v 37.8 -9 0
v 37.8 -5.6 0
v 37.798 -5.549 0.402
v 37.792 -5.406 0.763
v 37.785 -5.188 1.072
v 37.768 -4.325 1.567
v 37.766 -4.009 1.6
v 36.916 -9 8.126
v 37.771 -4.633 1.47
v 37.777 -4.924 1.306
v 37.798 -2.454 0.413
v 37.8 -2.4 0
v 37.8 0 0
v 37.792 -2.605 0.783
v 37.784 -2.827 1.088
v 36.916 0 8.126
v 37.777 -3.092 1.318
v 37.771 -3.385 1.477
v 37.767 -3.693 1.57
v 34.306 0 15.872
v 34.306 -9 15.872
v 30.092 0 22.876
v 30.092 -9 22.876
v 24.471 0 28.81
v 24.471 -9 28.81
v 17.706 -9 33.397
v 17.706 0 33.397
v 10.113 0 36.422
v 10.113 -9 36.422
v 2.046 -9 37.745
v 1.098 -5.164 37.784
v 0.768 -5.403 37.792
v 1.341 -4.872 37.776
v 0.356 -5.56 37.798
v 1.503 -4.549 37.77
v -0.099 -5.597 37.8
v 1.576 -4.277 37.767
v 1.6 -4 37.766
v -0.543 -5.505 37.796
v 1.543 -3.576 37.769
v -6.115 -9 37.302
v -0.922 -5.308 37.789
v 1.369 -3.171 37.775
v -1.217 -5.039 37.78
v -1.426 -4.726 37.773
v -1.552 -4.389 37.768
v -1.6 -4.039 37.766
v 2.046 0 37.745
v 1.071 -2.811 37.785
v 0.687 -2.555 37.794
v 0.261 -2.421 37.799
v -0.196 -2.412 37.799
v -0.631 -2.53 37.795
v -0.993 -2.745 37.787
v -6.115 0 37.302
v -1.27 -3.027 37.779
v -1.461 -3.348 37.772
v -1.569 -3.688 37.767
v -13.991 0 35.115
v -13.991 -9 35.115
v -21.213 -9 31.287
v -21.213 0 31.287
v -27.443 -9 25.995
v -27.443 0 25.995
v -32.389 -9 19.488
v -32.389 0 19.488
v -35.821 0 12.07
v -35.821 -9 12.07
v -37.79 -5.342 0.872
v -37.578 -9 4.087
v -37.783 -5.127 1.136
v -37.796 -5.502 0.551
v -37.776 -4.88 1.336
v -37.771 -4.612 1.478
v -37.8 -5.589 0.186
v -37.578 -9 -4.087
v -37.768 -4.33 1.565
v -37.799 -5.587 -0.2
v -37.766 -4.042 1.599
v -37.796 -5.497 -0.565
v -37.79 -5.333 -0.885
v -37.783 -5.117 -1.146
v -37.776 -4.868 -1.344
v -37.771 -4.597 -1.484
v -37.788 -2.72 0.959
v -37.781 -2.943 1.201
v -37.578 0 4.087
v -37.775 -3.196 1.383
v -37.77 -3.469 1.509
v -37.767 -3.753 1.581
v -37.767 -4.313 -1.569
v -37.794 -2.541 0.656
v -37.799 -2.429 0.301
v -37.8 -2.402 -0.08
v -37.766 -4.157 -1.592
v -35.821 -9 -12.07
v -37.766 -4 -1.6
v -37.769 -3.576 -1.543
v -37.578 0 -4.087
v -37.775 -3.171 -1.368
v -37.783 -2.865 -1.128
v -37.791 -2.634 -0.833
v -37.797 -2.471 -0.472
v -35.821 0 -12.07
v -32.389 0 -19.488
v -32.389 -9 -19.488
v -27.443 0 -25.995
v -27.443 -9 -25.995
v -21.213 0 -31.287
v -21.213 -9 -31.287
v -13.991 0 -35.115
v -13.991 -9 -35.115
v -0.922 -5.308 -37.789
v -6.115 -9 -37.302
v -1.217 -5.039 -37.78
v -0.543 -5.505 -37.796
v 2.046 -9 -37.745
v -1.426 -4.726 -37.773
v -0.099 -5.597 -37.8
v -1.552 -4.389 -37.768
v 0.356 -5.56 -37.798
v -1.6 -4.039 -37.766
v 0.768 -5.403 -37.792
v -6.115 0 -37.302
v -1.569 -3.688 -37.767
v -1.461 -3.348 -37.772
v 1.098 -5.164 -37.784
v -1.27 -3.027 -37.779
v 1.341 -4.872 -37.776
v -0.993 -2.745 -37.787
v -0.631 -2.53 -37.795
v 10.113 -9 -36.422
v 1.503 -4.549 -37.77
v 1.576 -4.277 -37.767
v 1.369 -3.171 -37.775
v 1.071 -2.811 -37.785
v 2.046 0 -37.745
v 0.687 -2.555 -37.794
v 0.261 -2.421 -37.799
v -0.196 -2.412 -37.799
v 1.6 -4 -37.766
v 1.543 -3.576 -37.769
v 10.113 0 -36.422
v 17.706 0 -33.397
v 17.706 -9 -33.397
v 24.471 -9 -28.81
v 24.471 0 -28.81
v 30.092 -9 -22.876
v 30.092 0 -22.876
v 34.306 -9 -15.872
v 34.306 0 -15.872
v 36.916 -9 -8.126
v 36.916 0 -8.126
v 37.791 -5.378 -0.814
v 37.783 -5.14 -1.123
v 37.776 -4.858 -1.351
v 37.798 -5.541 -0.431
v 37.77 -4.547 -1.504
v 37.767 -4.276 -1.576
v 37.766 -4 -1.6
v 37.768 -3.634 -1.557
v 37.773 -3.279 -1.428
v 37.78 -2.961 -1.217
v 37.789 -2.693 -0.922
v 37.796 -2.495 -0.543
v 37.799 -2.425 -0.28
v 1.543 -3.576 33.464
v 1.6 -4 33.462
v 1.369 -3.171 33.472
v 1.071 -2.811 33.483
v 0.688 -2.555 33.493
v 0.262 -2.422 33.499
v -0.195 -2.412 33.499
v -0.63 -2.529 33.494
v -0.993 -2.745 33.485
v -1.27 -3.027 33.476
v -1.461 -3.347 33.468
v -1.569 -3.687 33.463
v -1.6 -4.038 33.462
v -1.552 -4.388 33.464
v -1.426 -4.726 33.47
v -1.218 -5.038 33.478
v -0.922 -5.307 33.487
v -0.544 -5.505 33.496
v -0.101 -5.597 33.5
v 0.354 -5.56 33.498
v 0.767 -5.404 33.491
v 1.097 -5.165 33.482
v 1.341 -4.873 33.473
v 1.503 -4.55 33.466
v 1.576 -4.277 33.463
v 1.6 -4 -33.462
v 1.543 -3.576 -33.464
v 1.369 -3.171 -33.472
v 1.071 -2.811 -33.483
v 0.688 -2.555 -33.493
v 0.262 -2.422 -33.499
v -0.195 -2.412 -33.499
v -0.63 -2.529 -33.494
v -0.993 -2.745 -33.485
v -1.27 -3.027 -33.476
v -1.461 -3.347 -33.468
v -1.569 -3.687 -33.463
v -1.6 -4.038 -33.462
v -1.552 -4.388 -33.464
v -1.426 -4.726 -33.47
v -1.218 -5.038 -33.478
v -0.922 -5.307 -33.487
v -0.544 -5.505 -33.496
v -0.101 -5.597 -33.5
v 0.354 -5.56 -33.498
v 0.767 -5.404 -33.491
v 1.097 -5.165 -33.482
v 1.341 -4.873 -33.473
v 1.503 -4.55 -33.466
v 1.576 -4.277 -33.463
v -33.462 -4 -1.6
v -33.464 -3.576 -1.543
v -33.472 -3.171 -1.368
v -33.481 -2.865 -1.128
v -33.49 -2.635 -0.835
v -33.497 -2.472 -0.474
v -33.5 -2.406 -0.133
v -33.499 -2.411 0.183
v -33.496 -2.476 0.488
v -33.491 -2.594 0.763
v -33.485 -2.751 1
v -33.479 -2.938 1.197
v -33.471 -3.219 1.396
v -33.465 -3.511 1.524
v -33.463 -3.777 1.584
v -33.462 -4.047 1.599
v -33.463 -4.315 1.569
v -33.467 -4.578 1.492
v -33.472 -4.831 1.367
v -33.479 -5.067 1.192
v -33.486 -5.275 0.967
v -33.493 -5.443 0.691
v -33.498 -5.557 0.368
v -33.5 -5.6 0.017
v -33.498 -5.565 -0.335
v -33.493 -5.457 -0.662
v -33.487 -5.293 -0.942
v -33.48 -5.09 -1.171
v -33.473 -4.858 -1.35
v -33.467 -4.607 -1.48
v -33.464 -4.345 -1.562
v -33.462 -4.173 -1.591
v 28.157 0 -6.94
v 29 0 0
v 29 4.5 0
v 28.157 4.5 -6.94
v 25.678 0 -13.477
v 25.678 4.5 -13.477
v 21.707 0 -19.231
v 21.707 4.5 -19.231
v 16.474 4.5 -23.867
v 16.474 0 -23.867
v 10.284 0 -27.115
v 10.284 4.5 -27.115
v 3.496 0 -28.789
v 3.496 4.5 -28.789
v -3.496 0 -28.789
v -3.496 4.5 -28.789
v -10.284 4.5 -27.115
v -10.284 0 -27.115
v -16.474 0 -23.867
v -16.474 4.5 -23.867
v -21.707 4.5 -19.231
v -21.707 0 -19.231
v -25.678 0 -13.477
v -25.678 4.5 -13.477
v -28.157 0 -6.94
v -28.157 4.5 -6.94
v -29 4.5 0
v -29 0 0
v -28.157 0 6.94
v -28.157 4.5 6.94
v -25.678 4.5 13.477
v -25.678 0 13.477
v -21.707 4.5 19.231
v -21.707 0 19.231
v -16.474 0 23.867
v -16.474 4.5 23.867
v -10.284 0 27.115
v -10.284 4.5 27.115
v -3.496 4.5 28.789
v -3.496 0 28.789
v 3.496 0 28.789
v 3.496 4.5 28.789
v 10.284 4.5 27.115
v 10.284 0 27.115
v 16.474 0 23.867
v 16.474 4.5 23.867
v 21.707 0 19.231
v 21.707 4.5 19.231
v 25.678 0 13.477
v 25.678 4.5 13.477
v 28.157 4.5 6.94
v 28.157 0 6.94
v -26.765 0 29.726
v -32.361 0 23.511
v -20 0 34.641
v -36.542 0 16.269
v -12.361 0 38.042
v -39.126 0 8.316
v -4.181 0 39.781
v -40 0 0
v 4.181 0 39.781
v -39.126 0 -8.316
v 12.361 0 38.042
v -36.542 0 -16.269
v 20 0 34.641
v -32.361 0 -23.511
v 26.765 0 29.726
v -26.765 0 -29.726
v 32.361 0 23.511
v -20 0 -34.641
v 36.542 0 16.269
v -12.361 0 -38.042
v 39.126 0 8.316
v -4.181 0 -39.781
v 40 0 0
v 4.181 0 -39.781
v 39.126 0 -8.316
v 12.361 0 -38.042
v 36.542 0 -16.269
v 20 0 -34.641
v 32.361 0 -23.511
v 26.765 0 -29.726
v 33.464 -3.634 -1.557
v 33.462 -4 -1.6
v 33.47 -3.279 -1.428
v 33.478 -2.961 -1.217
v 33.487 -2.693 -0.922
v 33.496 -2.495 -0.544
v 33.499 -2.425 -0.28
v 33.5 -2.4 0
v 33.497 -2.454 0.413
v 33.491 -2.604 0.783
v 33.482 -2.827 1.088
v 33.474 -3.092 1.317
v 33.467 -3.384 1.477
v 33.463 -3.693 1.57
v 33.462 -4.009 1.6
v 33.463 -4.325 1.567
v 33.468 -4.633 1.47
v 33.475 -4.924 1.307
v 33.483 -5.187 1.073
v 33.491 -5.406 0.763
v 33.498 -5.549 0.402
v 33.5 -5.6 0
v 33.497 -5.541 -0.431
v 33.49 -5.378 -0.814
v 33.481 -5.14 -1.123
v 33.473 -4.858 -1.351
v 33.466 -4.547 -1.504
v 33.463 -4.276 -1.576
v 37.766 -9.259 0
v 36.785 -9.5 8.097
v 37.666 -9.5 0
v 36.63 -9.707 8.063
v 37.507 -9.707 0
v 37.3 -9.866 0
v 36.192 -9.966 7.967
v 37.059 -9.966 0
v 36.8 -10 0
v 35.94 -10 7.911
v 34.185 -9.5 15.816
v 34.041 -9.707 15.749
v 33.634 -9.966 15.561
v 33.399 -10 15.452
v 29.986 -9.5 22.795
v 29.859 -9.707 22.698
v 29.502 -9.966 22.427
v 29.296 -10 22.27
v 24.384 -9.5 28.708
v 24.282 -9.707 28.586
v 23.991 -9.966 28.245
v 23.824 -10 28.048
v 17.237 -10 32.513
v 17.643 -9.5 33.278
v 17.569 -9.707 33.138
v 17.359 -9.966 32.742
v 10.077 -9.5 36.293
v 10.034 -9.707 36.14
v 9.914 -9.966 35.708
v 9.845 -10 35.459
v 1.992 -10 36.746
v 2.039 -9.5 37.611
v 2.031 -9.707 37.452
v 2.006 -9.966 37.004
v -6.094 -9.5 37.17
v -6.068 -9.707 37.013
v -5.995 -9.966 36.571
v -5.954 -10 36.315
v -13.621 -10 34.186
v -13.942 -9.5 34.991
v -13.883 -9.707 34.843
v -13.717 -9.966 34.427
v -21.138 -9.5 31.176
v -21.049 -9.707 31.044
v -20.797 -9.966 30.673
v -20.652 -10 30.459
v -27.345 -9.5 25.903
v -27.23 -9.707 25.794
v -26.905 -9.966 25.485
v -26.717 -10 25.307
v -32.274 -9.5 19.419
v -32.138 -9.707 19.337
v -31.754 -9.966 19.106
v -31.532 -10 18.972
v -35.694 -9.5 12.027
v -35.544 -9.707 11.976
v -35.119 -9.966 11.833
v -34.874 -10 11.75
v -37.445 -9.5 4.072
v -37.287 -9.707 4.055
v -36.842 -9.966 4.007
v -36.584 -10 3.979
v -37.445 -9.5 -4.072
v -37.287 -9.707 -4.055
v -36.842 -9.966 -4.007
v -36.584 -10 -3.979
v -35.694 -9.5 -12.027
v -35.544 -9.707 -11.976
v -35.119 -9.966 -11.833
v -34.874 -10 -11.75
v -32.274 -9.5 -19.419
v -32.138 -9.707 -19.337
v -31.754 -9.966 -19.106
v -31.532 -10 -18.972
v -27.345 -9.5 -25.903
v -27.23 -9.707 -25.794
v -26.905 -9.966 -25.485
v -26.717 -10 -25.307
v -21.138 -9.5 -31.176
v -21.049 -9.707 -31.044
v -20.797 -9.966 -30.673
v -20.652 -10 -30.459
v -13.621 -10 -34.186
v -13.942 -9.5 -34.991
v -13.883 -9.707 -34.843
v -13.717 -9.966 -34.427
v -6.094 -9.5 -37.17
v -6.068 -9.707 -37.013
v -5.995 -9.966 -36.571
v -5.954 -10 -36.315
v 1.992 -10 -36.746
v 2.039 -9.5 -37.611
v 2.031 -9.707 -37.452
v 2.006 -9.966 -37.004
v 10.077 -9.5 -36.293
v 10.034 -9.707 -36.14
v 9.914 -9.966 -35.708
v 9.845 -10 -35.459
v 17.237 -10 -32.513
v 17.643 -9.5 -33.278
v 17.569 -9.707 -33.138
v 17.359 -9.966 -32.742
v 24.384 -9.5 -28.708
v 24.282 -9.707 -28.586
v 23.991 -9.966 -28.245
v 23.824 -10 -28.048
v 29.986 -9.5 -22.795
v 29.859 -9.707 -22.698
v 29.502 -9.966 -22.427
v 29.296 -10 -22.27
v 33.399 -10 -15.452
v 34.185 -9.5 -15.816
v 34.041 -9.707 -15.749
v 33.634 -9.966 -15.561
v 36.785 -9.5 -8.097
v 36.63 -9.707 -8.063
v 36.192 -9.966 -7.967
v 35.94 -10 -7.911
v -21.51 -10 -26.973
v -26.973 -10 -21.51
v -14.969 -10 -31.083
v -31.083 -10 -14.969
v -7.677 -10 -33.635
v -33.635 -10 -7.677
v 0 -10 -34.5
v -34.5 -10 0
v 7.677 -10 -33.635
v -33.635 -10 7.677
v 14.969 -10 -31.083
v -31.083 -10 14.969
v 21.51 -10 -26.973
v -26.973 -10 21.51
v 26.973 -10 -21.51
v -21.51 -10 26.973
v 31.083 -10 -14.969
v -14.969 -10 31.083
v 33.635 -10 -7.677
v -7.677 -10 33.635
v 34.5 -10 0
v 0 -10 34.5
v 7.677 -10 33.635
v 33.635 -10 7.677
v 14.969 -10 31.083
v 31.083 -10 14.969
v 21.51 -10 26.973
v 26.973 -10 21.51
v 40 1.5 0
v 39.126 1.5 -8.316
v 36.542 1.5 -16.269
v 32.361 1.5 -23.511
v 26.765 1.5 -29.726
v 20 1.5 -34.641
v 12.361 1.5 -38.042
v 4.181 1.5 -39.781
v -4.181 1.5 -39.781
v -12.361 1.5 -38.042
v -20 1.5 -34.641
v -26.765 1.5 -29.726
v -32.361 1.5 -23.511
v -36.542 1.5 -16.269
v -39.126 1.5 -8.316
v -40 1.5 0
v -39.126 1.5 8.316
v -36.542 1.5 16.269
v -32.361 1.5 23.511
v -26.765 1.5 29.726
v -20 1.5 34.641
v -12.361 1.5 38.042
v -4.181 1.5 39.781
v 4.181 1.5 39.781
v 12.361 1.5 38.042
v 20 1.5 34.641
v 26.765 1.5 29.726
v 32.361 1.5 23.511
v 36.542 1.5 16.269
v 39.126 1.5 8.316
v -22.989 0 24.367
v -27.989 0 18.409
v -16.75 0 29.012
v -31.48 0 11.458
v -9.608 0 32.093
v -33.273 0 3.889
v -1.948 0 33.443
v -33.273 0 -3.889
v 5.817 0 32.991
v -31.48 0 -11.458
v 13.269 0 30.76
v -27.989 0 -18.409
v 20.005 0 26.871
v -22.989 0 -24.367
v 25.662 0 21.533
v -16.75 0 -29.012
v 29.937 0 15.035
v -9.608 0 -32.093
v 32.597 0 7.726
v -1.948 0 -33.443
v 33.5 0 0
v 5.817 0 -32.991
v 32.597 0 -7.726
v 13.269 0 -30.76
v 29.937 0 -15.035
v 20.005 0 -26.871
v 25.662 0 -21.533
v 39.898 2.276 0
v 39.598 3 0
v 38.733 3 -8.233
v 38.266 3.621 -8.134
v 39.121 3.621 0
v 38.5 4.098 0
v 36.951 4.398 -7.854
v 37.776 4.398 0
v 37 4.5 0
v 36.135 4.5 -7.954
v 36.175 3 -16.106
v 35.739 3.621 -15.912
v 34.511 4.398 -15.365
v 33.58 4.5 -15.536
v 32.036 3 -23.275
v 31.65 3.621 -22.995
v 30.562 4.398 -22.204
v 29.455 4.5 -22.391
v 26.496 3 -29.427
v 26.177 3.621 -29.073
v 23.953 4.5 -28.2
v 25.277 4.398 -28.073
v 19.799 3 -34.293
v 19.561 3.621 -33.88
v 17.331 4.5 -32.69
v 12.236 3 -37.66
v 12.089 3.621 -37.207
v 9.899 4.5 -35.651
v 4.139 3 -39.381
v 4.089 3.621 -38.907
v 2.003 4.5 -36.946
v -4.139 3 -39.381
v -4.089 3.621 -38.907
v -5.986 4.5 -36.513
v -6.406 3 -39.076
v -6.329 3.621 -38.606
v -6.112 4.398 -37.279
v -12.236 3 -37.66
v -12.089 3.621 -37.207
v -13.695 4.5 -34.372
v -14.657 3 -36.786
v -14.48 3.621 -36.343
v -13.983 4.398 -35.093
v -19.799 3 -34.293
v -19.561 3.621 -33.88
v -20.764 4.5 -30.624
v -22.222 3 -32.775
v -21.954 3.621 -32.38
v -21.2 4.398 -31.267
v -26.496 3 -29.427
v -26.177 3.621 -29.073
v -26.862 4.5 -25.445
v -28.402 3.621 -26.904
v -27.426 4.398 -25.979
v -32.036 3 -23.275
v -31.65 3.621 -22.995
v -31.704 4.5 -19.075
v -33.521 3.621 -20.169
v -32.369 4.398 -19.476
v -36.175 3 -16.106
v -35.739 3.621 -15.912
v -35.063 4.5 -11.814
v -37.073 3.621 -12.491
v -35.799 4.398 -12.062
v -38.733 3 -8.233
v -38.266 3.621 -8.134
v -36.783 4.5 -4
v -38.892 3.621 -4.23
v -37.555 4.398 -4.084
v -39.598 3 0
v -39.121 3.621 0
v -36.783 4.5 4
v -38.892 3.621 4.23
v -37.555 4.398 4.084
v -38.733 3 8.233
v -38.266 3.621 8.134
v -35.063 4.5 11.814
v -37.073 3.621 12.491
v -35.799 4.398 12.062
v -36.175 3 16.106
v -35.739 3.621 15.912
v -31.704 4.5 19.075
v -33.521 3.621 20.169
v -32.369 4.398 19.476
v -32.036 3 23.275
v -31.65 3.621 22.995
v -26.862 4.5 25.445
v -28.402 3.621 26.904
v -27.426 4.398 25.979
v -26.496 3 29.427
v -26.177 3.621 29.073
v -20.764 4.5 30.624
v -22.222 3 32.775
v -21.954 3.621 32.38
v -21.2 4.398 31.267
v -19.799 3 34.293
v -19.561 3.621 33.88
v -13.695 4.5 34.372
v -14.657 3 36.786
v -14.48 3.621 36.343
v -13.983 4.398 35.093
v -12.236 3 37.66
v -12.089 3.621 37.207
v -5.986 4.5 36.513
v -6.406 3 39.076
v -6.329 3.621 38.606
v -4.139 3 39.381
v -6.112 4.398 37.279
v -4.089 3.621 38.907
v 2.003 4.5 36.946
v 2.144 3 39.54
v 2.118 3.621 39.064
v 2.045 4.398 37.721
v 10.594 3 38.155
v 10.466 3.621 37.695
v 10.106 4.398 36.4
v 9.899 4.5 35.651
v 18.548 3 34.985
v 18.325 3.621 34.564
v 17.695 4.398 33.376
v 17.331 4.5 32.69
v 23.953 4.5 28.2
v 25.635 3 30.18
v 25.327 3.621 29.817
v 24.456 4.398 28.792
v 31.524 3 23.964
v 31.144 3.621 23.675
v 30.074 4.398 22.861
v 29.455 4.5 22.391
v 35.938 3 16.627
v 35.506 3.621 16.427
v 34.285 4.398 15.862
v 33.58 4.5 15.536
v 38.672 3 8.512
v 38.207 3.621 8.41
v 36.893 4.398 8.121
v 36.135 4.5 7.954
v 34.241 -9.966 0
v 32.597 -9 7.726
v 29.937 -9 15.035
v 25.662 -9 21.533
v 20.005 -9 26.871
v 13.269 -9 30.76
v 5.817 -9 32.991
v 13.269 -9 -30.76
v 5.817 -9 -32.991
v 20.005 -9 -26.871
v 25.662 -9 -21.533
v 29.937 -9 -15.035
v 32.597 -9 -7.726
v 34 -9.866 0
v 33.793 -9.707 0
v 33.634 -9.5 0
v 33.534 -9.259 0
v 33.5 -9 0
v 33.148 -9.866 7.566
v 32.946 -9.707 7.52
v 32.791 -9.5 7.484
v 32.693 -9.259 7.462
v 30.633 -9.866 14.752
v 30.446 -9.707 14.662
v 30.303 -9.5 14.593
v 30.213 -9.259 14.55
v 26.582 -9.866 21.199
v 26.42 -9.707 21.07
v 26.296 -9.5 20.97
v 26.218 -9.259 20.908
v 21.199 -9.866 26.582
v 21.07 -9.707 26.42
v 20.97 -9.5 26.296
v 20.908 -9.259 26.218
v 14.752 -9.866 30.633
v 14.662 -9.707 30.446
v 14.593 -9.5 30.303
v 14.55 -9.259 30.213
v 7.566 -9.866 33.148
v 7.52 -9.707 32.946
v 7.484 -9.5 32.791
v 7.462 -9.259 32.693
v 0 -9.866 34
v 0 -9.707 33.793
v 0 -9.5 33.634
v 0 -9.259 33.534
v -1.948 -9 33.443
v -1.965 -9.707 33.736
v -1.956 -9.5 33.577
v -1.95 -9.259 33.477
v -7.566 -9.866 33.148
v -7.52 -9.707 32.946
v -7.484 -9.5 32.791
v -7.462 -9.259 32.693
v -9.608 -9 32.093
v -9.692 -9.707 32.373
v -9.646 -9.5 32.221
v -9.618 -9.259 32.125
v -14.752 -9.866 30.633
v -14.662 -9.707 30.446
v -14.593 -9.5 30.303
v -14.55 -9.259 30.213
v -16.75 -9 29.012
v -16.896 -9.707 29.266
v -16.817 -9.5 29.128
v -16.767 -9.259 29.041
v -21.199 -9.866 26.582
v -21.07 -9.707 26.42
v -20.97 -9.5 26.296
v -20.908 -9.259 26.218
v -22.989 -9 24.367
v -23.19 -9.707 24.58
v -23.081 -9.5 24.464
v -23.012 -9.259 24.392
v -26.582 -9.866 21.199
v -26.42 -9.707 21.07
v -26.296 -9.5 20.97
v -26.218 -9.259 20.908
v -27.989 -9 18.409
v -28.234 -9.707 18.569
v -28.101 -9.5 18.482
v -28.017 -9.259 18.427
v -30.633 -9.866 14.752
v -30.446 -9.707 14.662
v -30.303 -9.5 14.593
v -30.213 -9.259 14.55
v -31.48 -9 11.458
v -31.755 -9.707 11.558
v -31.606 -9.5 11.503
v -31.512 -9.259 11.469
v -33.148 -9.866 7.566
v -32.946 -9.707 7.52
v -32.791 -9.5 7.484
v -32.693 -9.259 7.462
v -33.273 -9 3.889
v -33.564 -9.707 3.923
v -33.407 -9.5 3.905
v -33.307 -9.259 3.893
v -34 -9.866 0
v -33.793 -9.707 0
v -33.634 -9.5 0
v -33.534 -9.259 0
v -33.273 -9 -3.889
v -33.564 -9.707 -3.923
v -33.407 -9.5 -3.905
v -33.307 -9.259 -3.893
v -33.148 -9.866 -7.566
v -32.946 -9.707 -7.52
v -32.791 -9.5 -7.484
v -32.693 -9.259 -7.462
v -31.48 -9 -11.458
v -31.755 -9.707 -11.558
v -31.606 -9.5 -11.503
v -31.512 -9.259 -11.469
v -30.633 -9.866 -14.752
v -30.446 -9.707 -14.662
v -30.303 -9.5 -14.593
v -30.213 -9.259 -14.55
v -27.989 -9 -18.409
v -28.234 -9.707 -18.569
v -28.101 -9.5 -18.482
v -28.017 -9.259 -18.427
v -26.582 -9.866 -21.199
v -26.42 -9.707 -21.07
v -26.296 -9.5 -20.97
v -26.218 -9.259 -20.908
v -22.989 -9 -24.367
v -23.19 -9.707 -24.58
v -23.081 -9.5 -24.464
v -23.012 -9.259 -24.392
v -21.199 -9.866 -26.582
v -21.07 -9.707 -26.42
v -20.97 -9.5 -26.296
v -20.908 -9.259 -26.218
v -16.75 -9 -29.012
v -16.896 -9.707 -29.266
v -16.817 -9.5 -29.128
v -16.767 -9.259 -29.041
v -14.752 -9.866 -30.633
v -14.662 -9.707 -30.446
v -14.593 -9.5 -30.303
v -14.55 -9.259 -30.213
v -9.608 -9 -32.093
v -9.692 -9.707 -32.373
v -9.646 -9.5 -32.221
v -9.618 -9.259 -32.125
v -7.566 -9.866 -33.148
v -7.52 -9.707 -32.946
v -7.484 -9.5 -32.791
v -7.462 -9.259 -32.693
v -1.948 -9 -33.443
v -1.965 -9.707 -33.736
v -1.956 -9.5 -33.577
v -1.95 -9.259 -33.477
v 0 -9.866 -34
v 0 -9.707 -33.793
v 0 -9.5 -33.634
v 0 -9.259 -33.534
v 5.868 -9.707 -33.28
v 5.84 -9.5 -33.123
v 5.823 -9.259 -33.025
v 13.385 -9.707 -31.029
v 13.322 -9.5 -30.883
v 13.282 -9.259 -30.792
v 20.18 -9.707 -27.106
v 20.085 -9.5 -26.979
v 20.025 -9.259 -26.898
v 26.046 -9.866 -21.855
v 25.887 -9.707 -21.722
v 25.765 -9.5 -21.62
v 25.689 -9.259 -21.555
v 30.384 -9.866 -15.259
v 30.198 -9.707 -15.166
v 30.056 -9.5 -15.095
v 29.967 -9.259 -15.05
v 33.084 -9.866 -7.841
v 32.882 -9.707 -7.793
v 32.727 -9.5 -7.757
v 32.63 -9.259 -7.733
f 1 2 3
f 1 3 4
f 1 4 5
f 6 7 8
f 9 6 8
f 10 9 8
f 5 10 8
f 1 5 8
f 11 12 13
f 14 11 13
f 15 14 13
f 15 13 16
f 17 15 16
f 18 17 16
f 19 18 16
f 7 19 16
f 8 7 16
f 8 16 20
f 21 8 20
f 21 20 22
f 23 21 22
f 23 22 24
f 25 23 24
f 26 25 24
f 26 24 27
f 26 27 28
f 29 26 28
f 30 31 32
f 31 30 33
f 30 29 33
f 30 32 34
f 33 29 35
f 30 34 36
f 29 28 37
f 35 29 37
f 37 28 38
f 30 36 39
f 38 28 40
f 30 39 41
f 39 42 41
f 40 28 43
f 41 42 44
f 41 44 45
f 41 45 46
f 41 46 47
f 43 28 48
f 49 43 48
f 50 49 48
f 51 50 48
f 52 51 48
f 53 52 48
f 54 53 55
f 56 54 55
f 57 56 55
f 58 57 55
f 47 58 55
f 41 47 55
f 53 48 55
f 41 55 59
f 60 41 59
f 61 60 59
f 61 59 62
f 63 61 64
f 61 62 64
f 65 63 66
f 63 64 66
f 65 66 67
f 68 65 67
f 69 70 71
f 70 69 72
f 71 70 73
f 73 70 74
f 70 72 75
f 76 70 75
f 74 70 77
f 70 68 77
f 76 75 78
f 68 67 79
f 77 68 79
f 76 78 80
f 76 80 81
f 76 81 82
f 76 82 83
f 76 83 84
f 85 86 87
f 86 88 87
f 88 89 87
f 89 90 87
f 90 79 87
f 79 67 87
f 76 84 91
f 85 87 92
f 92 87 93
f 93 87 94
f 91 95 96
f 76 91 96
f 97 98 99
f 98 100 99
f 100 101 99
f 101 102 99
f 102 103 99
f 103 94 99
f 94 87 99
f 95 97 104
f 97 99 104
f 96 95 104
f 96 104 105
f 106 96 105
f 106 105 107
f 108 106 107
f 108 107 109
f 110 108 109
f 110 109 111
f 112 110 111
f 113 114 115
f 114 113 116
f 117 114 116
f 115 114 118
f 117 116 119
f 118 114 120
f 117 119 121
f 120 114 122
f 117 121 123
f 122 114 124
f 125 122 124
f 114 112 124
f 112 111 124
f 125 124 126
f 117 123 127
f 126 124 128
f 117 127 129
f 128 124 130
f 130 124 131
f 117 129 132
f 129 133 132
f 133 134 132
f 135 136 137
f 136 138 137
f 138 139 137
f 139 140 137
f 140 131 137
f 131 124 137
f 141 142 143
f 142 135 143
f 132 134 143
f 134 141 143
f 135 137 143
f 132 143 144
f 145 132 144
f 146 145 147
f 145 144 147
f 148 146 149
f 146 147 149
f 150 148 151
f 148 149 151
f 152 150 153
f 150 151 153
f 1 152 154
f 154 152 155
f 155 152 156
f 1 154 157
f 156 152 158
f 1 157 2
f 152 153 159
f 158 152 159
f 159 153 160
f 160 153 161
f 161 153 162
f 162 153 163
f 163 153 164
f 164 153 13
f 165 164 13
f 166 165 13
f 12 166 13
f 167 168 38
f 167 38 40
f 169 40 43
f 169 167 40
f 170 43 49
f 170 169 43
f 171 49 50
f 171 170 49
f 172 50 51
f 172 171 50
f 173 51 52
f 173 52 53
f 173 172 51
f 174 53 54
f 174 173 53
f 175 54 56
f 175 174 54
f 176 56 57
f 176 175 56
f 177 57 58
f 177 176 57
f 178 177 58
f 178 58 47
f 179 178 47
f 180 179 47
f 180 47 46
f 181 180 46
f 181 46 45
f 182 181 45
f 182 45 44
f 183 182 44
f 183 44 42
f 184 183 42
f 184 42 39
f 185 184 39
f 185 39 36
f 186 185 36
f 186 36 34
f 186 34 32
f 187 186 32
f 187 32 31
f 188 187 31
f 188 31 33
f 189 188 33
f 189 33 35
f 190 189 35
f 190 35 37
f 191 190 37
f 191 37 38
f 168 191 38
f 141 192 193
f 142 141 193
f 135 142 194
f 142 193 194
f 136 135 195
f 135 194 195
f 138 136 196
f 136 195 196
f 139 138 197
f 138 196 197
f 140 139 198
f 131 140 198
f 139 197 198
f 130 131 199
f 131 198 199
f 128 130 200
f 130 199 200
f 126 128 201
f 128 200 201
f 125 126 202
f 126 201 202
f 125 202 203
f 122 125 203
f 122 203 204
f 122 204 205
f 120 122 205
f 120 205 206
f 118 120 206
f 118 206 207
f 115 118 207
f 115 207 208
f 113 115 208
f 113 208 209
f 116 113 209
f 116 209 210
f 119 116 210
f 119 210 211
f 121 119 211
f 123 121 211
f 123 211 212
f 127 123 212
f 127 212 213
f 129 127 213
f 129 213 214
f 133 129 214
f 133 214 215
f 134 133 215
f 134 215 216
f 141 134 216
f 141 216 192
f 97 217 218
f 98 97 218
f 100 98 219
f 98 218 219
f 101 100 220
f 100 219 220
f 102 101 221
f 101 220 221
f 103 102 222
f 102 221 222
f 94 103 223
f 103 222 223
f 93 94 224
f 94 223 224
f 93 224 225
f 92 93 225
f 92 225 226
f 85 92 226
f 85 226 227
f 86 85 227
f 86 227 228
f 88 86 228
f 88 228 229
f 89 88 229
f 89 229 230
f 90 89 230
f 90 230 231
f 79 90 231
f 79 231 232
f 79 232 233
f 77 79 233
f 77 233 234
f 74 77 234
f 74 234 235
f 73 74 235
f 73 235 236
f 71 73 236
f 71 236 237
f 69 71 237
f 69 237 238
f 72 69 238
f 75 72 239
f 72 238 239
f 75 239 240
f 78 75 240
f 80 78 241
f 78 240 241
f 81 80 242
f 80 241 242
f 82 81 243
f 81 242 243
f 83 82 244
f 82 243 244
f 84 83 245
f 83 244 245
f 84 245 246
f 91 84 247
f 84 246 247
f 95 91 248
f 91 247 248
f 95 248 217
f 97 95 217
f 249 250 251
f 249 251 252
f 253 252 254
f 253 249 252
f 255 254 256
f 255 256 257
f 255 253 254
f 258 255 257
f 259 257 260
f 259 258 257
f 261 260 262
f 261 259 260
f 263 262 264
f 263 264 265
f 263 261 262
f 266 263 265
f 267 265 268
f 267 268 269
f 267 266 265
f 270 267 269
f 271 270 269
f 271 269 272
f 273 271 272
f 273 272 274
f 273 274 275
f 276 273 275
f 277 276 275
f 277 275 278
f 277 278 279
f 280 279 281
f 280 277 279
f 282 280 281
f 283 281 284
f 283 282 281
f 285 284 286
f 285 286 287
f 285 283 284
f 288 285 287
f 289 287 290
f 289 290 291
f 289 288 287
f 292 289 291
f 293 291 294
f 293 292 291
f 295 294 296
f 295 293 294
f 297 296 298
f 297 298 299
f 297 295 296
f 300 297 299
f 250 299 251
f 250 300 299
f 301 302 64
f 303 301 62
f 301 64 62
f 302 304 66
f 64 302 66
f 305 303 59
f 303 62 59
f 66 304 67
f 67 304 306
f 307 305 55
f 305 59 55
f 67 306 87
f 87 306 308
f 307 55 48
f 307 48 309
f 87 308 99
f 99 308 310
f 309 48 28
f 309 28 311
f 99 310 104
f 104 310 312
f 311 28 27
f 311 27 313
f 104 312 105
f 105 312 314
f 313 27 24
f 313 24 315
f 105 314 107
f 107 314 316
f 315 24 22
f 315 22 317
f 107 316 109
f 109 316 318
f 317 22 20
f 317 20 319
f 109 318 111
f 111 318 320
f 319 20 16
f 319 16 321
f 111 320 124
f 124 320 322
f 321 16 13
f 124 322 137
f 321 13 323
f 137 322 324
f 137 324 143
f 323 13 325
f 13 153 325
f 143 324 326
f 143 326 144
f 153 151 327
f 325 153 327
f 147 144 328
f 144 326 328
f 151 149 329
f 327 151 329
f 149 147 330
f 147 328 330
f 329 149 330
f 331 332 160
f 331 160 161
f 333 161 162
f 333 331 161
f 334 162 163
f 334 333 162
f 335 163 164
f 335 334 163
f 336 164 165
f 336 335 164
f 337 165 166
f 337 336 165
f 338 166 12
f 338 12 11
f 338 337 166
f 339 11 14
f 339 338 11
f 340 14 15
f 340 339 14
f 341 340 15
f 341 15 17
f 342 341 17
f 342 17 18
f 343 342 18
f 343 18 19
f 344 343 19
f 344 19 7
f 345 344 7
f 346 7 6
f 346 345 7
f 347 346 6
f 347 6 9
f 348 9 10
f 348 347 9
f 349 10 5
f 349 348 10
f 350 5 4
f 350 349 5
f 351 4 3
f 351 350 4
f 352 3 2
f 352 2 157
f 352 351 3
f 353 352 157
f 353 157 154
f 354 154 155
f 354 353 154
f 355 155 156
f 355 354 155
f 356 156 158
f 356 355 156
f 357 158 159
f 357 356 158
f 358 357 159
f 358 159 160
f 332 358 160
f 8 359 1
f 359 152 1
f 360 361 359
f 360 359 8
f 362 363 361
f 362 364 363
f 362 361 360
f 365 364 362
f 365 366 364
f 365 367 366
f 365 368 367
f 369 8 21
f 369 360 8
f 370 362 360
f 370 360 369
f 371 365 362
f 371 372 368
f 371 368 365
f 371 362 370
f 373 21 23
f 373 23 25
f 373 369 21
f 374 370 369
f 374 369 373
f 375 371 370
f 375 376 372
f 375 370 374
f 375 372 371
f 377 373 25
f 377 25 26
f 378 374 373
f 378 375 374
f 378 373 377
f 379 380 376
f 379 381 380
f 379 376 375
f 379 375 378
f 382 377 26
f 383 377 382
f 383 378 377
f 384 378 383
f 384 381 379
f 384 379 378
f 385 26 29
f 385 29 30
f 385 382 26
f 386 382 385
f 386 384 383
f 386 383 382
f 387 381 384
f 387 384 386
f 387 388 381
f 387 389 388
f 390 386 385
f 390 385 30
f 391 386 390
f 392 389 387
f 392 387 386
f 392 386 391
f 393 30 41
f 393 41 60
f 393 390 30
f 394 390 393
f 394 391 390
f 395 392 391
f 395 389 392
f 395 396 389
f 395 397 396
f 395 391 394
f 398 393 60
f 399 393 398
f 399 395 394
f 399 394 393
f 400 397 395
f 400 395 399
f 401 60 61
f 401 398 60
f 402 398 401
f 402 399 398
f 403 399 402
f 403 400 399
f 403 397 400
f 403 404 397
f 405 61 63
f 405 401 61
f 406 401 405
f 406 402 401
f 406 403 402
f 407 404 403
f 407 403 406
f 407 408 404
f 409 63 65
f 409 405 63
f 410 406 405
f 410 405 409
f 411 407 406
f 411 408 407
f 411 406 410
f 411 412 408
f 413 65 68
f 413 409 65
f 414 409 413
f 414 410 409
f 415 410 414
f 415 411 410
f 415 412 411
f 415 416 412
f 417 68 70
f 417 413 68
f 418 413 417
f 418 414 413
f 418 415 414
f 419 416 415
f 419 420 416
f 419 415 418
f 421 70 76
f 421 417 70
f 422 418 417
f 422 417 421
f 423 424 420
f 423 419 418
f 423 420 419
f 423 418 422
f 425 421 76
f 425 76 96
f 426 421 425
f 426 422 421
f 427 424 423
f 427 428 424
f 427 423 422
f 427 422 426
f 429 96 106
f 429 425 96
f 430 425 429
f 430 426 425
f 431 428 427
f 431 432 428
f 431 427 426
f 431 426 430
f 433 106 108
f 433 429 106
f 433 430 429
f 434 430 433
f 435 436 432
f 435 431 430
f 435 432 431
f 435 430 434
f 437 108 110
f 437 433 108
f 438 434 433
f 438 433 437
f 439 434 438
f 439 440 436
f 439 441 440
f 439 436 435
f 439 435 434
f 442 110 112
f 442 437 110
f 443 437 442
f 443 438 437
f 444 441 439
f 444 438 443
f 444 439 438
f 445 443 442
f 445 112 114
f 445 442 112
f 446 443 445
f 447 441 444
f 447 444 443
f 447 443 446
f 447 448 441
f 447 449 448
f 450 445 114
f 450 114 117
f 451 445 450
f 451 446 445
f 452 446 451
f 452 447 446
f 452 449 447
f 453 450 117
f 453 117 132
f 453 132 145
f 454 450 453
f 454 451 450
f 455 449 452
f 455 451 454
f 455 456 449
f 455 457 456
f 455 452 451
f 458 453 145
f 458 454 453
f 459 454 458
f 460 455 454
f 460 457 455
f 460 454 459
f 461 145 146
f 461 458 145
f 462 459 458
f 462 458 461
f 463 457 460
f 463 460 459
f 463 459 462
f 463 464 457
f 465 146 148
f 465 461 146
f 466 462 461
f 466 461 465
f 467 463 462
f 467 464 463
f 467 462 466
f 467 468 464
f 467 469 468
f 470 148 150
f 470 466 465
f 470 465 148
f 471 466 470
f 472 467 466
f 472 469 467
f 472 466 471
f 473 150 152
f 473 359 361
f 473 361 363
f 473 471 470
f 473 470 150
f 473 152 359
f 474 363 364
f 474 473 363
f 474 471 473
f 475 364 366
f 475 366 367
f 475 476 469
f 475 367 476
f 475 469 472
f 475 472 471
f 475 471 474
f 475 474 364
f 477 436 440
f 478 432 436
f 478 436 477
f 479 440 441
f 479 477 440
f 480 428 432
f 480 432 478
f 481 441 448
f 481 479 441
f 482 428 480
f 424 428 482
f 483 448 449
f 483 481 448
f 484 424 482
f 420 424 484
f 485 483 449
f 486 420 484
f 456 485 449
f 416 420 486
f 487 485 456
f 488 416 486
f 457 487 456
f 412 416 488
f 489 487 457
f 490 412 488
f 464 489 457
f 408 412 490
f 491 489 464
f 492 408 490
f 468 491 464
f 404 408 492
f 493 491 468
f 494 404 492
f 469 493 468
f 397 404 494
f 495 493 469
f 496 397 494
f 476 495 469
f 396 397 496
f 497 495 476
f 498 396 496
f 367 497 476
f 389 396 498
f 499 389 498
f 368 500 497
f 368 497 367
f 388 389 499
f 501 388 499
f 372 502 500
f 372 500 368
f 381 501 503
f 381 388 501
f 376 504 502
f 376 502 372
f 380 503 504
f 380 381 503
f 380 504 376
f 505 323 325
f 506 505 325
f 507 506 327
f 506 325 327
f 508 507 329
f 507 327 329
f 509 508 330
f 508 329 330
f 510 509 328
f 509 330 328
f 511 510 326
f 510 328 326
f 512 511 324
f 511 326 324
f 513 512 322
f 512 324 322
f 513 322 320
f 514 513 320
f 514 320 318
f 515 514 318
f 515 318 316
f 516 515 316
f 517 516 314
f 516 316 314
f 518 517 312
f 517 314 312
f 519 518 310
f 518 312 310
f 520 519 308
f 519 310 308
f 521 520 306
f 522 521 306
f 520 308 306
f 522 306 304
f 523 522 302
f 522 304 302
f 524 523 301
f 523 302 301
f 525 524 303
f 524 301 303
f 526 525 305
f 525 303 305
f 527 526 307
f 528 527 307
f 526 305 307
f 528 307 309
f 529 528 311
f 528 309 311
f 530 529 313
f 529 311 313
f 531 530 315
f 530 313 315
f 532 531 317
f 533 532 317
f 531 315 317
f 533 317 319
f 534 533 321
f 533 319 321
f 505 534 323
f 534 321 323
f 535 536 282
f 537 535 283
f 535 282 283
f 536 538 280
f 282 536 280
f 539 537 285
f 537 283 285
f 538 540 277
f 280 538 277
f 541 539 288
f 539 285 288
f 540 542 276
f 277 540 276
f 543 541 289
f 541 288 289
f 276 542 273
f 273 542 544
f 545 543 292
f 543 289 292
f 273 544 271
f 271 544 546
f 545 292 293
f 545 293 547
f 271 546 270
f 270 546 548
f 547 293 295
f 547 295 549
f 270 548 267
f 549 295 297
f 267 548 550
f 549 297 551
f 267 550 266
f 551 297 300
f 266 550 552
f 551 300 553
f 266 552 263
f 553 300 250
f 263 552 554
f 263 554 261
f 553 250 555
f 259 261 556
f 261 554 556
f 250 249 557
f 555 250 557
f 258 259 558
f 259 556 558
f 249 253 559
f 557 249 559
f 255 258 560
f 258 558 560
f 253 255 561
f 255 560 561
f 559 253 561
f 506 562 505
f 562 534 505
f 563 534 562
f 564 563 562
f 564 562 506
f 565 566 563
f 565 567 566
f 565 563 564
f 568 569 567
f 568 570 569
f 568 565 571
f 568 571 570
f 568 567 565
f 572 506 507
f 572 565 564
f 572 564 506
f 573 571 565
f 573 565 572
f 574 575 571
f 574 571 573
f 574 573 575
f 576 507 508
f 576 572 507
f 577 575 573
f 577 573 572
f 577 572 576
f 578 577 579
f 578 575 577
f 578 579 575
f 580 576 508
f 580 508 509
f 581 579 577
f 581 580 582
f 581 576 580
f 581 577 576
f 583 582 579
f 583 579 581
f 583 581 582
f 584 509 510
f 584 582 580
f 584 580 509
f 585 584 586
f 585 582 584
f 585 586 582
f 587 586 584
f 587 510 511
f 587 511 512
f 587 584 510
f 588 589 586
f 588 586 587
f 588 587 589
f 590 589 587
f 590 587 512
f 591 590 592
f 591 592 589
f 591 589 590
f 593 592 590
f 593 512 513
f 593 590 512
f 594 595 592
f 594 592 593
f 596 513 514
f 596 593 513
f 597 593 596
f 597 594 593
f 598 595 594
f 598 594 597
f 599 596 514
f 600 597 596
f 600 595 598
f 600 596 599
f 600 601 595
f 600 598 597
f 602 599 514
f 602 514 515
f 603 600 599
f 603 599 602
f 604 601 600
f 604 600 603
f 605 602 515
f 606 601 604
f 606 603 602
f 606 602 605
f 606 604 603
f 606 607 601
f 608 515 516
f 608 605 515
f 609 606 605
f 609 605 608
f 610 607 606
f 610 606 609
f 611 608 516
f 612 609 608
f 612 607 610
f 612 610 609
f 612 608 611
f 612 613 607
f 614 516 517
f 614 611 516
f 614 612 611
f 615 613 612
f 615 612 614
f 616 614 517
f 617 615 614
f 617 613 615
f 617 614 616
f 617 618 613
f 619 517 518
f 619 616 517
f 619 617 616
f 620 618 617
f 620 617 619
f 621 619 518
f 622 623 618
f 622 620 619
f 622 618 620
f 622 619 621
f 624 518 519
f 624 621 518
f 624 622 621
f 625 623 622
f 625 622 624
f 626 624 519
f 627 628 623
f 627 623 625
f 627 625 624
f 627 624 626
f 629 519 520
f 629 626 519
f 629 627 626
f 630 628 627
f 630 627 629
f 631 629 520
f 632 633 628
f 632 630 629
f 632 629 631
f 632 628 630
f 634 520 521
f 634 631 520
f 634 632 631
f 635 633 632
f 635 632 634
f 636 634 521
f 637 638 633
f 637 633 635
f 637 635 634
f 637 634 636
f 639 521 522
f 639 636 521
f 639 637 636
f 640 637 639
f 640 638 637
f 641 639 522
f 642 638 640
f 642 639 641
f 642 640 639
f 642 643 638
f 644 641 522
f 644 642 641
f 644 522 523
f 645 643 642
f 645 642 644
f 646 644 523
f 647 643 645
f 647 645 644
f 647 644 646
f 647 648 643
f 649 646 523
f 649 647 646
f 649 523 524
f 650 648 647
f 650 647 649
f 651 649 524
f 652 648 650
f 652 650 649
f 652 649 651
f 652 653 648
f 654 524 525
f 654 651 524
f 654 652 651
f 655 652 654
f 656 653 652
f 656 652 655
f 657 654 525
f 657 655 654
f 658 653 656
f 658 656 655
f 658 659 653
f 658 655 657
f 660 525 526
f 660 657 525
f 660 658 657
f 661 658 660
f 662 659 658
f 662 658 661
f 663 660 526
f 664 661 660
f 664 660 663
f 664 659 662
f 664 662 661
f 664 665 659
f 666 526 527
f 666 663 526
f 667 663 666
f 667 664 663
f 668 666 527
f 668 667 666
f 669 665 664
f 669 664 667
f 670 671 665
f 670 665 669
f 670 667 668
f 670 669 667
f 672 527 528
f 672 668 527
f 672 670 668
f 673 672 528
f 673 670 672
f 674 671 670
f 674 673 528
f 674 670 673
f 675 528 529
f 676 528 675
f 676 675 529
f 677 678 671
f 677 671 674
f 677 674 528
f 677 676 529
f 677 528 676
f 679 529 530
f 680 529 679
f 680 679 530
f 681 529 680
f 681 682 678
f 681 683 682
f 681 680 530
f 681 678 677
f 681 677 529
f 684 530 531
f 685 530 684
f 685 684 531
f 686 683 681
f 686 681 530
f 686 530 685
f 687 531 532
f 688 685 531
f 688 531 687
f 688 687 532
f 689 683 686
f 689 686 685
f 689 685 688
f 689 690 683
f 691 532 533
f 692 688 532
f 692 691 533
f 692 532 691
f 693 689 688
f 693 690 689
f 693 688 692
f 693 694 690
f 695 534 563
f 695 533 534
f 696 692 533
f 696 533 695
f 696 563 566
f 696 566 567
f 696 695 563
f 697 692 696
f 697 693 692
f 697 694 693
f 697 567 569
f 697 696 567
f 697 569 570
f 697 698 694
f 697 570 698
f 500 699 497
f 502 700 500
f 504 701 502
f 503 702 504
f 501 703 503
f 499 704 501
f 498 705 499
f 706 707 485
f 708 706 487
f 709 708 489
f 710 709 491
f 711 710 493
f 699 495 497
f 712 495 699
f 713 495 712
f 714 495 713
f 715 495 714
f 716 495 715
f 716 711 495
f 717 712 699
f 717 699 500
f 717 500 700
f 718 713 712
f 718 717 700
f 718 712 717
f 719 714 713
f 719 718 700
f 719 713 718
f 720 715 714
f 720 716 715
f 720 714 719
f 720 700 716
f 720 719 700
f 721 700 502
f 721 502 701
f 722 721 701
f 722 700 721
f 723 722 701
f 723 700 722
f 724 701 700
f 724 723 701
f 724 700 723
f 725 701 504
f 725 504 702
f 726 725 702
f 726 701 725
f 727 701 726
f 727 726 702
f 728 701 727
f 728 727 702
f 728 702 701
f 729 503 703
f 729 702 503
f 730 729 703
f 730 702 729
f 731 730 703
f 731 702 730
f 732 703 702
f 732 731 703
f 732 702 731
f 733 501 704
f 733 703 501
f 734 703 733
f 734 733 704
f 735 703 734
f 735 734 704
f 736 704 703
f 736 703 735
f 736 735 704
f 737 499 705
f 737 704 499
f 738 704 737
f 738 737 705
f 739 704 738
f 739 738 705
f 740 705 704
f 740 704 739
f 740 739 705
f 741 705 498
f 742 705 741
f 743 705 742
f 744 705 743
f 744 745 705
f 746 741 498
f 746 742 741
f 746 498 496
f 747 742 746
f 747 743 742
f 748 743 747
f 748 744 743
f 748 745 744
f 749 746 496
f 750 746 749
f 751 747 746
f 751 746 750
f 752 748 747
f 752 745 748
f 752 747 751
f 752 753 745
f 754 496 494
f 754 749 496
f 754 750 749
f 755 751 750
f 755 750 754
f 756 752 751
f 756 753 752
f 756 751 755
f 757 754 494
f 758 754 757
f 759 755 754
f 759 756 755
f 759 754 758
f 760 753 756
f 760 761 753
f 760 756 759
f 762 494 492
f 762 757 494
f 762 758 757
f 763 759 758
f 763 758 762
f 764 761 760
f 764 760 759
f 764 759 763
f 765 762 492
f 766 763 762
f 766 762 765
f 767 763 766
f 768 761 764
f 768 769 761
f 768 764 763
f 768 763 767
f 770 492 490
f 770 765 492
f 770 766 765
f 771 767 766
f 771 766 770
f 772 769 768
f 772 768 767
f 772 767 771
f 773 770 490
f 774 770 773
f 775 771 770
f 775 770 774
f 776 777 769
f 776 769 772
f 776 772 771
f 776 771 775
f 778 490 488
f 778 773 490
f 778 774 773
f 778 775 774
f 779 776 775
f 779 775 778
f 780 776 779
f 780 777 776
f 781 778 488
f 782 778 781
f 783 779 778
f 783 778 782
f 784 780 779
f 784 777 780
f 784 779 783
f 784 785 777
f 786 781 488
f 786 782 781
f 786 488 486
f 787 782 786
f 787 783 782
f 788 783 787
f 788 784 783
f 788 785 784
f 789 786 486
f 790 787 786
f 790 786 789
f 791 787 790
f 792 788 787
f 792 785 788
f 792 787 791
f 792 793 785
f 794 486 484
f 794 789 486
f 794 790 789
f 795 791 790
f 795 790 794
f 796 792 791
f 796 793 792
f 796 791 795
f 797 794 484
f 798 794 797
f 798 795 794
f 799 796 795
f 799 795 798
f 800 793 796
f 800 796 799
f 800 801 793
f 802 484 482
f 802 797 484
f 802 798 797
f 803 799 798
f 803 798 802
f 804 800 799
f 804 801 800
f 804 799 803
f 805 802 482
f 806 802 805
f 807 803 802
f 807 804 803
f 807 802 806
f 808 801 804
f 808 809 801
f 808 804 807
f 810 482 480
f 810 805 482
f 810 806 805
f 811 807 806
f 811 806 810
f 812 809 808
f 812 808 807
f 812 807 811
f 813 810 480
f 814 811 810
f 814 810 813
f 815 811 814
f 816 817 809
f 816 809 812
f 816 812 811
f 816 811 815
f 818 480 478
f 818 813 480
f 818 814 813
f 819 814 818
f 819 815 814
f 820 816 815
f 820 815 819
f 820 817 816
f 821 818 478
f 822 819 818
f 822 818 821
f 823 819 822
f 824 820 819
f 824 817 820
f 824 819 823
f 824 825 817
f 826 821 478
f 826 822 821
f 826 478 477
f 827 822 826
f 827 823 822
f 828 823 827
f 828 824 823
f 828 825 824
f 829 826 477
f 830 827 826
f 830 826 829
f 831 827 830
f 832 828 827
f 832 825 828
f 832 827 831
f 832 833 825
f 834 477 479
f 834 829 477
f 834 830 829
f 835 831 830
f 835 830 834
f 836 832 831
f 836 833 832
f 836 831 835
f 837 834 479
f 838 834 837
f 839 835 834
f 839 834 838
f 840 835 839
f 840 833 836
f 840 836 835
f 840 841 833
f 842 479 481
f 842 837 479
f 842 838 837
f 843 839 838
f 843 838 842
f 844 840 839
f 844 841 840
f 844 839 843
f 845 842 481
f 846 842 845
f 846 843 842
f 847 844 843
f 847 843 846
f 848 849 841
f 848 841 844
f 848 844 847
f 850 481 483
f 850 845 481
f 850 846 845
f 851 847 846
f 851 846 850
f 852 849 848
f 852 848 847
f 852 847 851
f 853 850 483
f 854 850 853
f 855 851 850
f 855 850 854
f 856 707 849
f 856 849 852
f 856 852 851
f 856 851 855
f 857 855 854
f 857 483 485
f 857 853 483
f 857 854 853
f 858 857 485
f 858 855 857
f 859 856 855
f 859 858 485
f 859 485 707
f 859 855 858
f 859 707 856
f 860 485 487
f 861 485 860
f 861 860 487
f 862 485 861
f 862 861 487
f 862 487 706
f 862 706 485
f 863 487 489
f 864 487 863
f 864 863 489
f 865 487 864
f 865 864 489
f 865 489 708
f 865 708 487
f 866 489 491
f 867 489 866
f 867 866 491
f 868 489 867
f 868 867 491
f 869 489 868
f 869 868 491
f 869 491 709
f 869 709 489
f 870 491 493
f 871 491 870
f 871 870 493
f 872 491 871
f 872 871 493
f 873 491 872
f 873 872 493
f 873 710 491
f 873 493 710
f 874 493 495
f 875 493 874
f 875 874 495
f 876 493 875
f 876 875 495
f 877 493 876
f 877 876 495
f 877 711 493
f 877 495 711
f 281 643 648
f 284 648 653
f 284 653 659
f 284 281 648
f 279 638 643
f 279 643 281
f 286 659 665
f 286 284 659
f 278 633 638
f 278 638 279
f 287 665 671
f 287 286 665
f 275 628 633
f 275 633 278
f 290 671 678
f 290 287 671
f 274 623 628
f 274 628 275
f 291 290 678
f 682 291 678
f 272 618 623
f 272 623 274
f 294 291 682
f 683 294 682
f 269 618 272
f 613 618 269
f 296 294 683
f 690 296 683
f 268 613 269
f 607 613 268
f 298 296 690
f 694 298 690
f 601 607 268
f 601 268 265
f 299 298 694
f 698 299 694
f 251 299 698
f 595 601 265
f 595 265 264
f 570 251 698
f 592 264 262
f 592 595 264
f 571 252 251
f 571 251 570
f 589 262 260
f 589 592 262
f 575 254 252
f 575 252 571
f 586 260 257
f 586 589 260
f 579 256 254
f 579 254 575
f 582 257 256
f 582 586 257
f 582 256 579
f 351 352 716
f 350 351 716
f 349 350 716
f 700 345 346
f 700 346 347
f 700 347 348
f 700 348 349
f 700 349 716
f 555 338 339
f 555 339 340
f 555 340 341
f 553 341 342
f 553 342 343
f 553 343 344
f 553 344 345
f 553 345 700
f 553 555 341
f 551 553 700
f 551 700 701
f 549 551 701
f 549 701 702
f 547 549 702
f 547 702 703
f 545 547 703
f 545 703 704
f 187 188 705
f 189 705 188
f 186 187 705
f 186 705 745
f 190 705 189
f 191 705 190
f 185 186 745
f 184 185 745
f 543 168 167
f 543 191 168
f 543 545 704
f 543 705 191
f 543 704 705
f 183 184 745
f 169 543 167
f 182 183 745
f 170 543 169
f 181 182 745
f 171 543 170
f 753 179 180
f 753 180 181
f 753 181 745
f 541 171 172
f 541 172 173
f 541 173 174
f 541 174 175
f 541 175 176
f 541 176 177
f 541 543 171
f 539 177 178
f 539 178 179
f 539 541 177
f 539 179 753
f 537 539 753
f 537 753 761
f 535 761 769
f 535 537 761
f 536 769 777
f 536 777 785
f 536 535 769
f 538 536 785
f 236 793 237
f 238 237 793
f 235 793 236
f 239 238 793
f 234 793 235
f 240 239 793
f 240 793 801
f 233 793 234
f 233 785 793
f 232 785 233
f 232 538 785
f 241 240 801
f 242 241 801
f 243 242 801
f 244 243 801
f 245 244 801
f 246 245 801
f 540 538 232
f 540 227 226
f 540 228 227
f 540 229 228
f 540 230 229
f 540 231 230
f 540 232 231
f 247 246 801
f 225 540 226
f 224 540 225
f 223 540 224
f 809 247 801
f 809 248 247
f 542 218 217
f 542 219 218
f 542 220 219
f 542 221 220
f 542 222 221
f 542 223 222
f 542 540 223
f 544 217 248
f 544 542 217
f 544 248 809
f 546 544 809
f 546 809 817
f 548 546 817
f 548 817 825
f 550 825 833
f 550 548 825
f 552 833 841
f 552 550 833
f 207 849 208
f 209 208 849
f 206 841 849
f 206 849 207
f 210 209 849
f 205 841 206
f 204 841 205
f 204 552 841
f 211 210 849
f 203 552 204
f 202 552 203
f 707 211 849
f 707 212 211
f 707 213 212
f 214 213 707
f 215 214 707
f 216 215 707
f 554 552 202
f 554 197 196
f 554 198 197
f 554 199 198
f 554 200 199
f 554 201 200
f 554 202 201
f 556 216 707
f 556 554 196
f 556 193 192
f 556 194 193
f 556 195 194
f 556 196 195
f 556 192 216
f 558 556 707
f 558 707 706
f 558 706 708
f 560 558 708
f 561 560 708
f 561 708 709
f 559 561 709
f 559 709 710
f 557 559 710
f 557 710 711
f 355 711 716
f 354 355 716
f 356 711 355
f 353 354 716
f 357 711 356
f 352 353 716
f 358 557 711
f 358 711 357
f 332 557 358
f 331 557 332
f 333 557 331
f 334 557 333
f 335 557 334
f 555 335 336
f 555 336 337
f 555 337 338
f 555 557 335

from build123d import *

# Parameters (mm, degrees)
SKETCH_1_R               = 40
SKETCH_1_R_2             = 29
EXTRUDE_1_DEPTH          = 4.5
SKETCH_2_R               = 37.8
SKETCH_2_R_2             = 33.5
EXTRUDE_2_DEPTH          = 10
FILLET_1_R               = 1
FILLET_2_R               = 3
SKETCH_3_R               = 1.6
CUT_EXTRUDE_1_DEPTH      = 41
CUT_EXTRUDE_1_DEPTH_BACK = 41.0000001
SKETCH_4_R               = 1.6
CUT_EXTRUDE_2_DEPTH      = 41
CUT_EXTRUDE_2_DEPTH_BACK = 41


with BuildPart() as part:
    # 草图1 → 凸台-拉伸1 (new body)
    with BuildSketch(Plane(origin=(0, 0, 0), x_dir=(1, 0, 0), z_dir=(0, 1, 0))):
        Circle(SKETCH_1_R)
        Circle(SKETCH_1_R_2, mode=Mode.SUBTRACT)
    extrude(amount=EXTRUDE_1_DEPTH)

    # 草图2 → 凸台-拉伸2 (add)
    with BuildSketch(Plane.XZ):
        Circle(SKETCH_2_R)
        Circle(SKETCH_2_R_2, mode=Mode.SUBTRACT)
    extrude(amount=EXTRUDE_2_DEPTH)

    # 圆角1
    fillet_1_edges = [part.edges().sort_by_distance(p)[0] for p in [
        (-37.8, -10, 0),
        (-33.5, -10, 0),
    ]]
    fillet(fillet_1_edges, radius=FILLET_1_R)

    # 圆角2
    fillet_2_edges = [part.edges().sort_by_distance(p)[0] for p in [
        (-40, 4.5, 0),
    ]]
    fillet(fillet_2_edges, radius=FILLET_2_R)

    # 草图3 → 切除-拉伸1 (cut, two sides)
    with BuildSketch(Plane(origin=(0, 0, 0), x_dir=(0, 0, -1), z_dir=(1, 0, 0))) as cut_extrude_1_sk:
        with Locations((0, -4)):
            Circle(SKETCH_3_R)
    extrude(amount=CUT_EXTRUDE_1_DEPTH, mode=Mode.SUBTRACT)
    extrude(cut_extrude_1_sk.sketch, amount=-CUT_EXTRUDE_1_DEPTH_BACK, mode=Mode.SUBTRACT)

    # 草图4 → 切除-拉伸2 (cut, two sides)
    with BuildSketch(Plane.XY) as cut_extrude_2_sk:
        with Locations((0, -4)):
            Circle(SKETCH_4_R)
    extrude(amount=CUT_EXTRUDE_2_DEPTH, mode=Mode.SUBTRACT)
    extrude(cut_extrude_2_sk.sketch, amount=-CUT_EXTRUDE_2_DEPTH_BACK, mode=Mode.SUBTRACT)


solid = part.part
